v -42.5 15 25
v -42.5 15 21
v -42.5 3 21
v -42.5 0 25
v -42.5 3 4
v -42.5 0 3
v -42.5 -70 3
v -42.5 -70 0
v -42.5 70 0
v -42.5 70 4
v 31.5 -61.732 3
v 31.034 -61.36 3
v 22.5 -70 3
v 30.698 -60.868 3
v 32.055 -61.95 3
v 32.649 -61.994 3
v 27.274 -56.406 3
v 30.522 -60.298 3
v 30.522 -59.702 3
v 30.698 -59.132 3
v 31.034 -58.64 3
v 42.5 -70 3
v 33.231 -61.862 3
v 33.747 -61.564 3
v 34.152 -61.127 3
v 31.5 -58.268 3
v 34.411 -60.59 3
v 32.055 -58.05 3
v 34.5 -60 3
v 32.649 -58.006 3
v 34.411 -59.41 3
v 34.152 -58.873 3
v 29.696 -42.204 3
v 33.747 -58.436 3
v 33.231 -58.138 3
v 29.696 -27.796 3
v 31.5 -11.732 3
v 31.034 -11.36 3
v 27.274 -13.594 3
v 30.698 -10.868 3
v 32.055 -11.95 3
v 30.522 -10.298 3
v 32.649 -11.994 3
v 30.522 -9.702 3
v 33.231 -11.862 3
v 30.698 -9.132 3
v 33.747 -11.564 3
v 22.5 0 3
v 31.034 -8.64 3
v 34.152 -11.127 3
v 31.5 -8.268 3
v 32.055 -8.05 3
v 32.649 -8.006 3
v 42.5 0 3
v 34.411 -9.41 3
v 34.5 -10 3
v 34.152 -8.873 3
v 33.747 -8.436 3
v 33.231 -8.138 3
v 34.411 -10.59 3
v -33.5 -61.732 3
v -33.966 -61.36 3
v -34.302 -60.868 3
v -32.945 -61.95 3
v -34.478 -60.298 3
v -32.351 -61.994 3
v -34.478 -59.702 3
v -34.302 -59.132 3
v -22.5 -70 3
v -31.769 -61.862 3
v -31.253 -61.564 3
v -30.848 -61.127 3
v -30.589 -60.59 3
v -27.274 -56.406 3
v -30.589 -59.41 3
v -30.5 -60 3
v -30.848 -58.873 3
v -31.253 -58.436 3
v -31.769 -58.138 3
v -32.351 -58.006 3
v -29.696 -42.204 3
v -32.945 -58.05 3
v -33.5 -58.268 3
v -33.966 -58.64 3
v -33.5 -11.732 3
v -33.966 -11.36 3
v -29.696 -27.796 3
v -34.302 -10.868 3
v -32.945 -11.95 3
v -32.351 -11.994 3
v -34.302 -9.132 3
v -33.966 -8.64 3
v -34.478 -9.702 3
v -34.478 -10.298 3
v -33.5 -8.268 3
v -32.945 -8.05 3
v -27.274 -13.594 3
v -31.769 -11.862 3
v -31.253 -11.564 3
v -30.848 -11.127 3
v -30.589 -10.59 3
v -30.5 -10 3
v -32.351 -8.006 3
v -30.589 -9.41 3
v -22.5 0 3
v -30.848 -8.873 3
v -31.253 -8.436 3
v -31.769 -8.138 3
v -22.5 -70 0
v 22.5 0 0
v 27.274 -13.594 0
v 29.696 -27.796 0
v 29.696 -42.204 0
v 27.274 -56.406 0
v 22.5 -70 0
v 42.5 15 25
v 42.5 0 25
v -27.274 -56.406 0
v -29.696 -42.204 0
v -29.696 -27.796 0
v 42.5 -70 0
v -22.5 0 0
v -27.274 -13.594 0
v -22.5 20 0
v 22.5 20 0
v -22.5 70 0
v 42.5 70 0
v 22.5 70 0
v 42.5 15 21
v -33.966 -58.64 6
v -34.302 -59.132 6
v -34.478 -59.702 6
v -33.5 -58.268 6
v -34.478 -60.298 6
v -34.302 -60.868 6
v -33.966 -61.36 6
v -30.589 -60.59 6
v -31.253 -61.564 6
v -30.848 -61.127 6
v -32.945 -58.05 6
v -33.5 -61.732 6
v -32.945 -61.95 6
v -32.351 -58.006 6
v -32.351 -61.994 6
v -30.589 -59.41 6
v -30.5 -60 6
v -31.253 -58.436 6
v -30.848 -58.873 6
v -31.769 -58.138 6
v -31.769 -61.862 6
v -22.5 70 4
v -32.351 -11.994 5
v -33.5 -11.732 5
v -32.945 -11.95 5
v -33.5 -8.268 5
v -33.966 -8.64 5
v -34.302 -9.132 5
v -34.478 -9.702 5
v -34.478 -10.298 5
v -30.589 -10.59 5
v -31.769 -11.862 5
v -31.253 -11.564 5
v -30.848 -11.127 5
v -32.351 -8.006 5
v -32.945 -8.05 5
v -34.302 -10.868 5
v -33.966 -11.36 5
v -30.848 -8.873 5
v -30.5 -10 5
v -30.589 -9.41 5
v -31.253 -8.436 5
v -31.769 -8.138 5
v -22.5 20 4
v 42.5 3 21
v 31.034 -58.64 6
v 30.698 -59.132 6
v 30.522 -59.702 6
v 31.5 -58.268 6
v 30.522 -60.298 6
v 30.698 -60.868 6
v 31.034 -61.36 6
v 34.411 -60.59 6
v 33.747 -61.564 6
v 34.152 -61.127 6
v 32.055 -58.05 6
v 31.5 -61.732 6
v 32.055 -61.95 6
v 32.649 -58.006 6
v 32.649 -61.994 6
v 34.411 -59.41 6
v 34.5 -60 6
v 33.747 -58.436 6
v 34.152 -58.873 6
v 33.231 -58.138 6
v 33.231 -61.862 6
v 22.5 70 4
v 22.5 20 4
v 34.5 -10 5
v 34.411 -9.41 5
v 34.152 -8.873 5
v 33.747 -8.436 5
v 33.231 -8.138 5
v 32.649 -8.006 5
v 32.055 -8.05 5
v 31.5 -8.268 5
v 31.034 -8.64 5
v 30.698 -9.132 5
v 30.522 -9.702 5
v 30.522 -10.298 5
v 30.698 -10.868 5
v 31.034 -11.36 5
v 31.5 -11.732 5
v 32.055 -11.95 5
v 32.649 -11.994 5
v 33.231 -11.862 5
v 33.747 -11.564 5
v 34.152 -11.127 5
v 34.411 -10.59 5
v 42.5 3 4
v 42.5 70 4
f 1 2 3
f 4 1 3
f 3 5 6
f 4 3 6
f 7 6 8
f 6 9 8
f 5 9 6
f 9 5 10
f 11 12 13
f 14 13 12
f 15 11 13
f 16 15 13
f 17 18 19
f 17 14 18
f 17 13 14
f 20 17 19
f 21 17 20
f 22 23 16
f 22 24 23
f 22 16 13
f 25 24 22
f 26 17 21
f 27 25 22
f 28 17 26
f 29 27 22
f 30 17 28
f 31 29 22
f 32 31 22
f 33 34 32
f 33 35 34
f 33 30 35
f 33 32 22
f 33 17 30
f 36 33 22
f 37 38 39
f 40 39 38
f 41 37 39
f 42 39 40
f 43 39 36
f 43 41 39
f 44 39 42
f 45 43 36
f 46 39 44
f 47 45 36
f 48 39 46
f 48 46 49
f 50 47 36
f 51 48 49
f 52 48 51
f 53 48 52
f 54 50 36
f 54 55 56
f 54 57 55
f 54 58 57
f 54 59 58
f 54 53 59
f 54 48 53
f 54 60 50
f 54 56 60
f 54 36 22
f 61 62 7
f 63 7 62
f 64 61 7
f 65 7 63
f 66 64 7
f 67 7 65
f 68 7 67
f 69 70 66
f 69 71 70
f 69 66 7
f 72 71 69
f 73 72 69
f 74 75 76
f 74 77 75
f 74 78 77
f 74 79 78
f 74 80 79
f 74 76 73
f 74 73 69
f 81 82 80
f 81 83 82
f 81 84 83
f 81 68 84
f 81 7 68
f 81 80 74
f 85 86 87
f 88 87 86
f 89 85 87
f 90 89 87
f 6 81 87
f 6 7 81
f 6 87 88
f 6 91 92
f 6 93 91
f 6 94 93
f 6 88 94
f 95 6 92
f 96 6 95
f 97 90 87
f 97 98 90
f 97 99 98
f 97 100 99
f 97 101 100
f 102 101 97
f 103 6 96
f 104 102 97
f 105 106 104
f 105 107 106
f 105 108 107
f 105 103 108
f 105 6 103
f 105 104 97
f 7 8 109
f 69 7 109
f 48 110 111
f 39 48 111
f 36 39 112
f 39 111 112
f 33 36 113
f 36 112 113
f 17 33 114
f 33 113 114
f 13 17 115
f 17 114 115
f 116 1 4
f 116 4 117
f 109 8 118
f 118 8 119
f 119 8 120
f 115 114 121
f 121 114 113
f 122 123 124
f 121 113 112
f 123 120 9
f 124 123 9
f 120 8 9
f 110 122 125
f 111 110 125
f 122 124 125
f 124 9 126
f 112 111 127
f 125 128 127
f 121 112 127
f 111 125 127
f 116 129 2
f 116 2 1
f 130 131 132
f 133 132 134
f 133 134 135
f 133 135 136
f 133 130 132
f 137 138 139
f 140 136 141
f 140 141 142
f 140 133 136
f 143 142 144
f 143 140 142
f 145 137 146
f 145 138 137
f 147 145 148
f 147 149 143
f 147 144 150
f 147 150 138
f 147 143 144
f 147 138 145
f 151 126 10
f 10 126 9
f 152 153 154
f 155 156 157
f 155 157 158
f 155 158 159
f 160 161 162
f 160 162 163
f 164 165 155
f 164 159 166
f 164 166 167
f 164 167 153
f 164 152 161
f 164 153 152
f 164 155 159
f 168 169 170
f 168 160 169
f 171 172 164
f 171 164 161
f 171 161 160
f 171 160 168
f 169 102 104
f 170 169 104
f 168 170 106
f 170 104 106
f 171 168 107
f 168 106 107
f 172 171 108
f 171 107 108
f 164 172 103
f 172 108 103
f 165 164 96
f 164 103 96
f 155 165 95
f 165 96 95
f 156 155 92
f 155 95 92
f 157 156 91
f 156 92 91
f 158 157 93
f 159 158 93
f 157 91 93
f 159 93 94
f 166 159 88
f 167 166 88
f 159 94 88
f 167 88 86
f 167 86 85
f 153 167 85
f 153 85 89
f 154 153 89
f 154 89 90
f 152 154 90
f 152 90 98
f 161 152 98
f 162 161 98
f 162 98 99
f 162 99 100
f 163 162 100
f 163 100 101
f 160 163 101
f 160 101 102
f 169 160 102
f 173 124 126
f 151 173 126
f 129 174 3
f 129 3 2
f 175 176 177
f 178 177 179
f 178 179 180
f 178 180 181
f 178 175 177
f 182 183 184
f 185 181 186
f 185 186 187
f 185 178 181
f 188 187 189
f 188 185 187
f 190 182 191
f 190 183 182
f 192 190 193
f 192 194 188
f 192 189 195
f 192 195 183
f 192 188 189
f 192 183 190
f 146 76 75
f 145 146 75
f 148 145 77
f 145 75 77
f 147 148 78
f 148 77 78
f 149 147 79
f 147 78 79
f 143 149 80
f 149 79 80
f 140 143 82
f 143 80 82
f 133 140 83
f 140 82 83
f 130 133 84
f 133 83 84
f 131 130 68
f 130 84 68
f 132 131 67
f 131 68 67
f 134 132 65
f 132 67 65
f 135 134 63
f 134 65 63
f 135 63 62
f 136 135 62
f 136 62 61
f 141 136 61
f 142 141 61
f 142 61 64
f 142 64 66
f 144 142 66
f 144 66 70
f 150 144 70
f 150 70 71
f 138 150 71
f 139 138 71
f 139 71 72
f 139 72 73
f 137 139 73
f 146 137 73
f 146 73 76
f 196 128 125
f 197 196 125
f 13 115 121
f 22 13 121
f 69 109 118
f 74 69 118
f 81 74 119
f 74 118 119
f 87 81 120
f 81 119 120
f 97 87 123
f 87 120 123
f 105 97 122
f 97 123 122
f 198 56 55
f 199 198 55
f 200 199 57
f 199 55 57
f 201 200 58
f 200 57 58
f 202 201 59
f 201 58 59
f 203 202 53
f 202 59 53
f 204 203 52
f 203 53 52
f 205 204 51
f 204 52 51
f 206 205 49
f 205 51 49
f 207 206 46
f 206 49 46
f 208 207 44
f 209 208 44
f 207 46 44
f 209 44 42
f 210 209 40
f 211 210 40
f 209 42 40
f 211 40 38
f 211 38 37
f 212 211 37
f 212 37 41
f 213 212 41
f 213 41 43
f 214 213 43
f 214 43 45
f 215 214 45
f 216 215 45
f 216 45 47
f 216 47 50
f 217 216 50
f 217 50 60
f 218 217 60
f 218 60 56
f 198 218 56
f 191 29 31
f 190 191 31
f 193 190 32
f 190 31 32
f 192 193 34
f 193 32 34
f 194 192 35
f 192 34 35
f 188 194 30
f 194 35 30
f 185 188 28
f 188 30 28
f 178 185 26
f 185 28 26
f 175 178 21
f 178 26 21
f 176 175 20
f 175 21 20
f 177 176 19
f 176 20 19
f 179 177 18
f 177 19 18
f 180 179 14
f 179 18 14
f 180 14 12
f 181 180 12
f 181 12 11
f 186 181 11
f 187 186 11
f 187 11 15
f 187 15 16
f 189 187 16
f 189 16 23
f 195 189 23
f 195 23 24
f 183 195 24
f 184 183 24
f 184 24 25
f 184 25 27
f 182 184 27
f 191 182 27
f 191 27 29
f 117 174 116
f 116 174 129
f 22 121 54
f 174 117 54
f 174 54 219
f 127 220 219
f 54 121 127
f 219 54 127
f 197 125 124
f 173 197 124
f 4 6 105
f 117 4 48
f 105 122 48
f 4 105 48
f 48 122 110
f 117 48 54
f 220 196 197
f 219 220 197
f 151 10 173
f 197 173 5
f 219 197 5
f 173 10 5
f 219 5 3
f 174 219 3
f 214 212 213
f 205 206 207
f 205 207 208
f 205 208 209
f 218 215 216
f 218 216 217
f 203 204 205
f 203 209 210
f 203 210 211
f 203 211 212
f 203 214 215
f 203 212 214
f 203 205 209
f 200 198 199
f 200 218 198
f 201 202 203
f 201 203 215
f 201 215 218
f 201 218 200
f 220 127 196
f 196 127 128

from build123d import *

# Parameters (mm, degrees)
F1_DEPTH = 25
F0_R     = 2
F2_DEPTH = 3
F3_DEPTH = 5
F4_W     = 55
F4_H     = 4
F5_DEPTH = 85.001
F6_DEPTH = 6


with BuildPart() as f1:
    # F0 (on Top) → F1 (new body)
    with BuildSketch(Plane.XY):
        Polygon((-42.5, 0), (-22.5, 0), (22.5, 0), (42.5, 0), (42.5, 70), (22.5, 70), (22.5, 20), (0, 20), (-22.5, 20), (-22.5, 70), (-42.5, 70), align=None)
    extrude(amount=F1_DEPTH)

    # F0 (on Top) → F2 (join)
    with BuildSketch(Plane.XY):
        with BuildLine():
            ThreePointArc((-22.5, -70), (-30, -35), (-22.5, 0))
            Line((-22.5, 0), (-42.5, 0))
            Line((-42.5, 0), (-42.5, -70))
            Line((-42.5, -70), (-22.5, -70))
        make_face()
        with Locations((-32.5, -60)):
            Circle(F0_R, mode=Mode.SUBTRACT)
        with Locations((-32.5, -10)):
            Circle(F0_R, mode=Mode.SUBTRACT)
        with BuildLine():
            Line((42.5, 0), (22.5, 0))
            ThreePointArc((22.5, 0), (30, -35), (22.5, -70))
            Line((22.5, -70), (42.5, -70))
            Line((42.5, -70), (42.5, 0))
        make_face()
        with Locations((32.5, -60)):
            Circle(F0_R, mode=Mode.SUBTRACT)
        with Locations((32.5, -10)):
            Circle(F0_R, mode=Mode.SUBTRACT)
    extrude(amount=F2_DEPTH)

    # F0 (on Top) → F3 (join)
    with BuildSketch(Plane.XY):
        with Locations((-32.5, -10)):
            Circle(F0_R)
        with Locations((32.5, -10)):
            Circle(F0_R)
    extrude(amount=F3_DEPTH)

    # F4 (on face) → F5 (cut, through all)
    with BuildSketch(Plane(origin=(-42.5, 0, 0), x_dir=(0, -1, 0), z_dir=(-1, 0, 0))):
        Polygon((-15, 21), (-70, 21), (-70, 4), (-3, 4), (-3, 21), align=None)
        with Locations((-42.5, 23)):
            Rectangle(F4_W, F4_H)
    extrude(amount=-F5_DEPTH, mode=Mode.SUBTRACT)

    # F0 (on Top) → F6 (join)
    with BuildSketch(Plane.XY):
        with Locations((-32.5, -60)):
            Circle(F0_R)
        with Locations((32.5, -60)):
            Circle(F0_R)
    extrude(amount=F6_DEPTH)


solid = f1.part
